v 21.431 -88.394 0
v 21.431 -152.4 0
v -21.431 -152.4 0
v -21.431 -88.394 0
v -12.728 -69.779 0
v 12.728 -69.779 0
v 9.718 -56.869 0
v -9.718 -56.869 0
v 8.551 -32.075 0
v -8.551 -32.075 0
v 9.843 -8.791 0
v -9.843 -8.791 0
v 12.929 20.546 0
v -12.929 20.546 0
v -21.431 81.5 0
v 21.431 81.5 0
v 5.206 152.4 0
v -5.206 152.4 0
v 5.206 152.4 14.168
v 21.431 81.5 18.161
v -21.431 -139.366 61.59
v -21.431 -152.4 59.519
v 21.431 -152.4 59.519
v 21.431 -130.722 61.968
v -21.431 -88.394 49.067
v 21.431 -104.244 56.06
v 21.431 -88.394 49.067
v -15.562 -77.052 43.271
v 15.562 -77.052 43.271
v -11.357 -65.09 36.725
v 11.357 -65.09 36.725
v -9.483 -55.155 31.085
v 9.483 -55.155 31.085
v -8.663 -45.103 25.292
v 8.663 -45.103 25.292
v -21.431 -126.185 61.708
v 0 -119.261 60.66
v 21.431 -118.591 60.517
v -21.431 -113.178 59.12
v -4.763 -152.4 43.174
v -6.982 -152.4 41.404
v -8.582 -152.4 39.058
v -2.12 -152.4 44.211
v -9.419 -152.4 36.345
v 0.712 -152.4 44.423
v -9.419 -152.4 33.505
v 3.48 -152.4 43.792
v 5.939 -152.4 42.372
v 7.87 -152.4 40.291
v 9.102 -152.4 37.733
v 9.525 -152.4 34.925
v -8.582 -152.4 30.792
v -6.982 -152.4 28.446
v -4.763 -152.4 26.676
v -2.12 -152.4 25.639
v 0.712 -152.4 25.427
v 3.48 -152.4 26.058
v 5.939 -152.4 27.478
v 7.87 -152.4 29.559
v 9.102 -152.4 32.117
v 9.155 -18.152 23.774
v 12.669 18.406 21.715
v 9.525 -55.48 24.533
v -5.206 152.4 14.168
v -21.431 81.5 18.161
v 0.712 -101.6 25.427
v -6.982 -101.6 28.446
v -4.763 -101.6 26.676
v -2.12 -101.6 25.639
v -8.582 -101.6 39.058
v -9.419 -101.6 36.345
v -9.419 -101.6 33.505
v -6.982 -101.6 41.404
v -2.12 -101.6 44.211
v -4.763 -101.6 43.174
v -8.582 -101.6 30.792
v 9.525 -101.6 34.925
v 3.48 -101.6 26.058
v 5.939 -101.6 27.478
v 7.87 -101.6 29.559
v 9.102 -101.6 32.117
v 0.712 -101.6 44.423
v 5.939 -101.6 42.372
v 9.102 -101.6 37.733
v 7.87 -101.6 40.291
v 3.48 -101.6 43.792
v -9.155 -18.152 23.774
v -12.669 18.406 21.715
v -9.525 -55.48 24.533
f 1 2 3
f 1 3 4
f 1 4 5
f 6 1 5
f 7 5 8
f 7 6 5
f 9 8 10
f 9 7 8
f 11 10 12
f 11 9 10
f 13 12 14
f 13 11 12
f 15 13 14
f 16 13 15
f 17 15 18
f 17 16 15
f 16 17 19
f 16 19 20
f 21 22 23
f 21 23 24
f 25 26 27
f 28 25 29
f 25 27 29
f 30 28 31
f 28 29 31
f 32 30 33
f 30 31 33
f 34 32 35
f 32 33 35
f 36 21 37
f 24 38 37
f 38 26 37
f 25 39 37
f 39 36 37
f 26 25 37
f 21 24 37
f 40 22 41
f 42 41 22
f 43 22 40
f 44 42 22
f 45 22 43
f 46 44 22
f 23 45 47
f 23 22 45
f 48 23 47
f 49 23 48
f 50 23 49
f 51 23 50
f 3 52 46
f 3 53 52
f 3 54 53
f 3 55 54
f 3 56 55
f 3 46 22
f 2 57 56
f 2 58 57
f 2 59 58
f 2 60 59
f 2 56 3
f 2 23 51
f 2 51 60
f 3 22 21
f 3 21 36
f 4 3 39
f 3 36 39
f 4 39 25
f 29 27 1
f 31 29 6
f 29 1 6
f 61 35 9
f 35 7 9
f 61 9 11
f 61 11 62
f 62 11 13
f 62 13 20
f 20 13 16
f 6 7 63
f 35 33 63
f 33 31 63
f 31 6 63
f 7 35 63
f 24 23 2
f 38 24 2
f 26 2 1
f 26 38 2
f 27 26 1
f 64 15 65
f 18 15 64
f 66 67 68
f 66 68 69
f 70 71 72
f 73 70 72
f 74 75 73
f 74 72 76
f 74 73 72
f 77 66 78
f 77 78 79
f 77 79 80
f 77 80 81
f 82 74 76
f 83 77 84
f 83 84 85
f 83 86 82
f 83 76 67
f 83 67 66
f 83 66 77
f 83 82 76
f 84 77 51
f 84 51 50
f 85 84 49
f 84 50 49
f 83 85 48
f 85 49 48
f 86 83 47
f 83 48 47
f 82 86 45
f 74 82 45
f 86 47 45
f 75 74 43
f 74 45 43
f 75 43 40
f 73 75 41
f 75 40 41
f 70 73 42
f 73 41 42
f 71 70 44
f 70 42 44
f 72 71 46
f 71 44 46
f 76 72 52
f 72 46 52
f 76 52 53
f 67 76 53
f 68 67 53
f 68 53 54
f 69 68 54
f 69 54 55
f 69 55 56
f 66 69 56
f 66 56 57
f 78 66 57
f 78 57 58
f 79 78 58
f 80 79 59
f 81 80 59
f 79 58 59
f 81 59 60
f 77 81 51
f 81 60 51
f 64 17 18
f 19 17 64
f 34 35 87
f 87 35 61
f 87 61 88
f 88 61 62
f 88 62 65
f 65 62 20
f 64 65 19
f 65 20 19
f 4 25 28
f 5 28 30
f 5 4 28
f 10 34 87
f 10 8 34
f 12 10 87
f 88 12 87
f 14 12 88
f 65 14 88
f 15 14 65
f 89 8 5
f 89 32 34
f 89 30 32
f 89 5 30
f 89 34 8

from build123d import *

# Parameters (mm, degrees)
F1_DEPTH = 21.43125
F2_R     = 9.525
F3_DEPTH = 50.8
F6_DEPTH = 42.8635
F7_DEPTH = 61.9829719698


with BuildPart() as f1:
    # F0 (on Right) → F1 (new body, symmetric)
    with BuildSketch(Plane.YZ):
        Polygon((-152.4, 69.85), (-152.4, 0), (152.4, 0), (152.4, 19.05), align=None)
    extrude(amount=F1_DEPTH, both=True)

    # F2 (on face) → F3 (cut)
    with BuildSketch(Plane.XZ.offset(152.4)):
        with Locations((0, 34.925)):
            Circle(F2_R)
    extrude(amount=-F3_DEPTH, mode=Mode.SUBTRACT)

    # F4 (on face) → F6 (cut, through all)
    with BuildSketch(Plane.YZ.offset(21.43125)):
        with BuildLine():
            Line((-152.4, 69.85), (-152.4, 59.5187321305))
            add(Edge.make_bspline(
                [(-152.4, 59.5187321305), (-142.2583344868, 61.4276814743), (-116.1526932903, 66.3415042155), (-72.0639469007, 40.8688743493), (-45.1030433178, 25.2919942141)],
                knots=[0, 0, 0, 0, 0.3884855935, 1, 1, 1, 1], degree=3))
            Line((-45.1030433178, 25.2919942141), (152.4, 14.1683043912))
            Line((152.4, 14.1683043912), (152.4, 19.05))
            Line((152.4, 19.05), (-152.4, 69.85))
        make_face()
    extrude(amount=-F6_DEPTH, mode=Mode.SUBTRACT)

    # F5 (on face) → F7 (intersect, through all)
    with BuildSketch(Plane(origin=(0, 0, 0), x_dir=(1, 0, 0), z_dir=(0, 0, -1))):
        with BuildLine():
            Line((-21.43125, 152.4), (-21.43125, 88.3942618966))
            add(Edge.make_bspline(
                [(-21.43125, 88.3942618966), (-16.4613031807, 79.4460650051), (-1.6409073495, 52.762515919), (-13.5294629941, -27.8924381707), (-21.43125, -81.5001502633)],
                knots=[0, 0, 0, 0, 0.3353450796, 1, 1, 1, 1], degree=3))
            Line((-21.43125, -81.5001502633), (-5.206305068, -152.4))
            Line((-5.206305068, -152.4), (5.206305068, -152.4))
            Line((5.206305068, -152.4), (21.43125, -81.5001502633))
            add(Edge.make_bspline(
                [(21.43125, 88.3942618966), (16.4613031807, 79.4460650051), (1.6409073495, 52.762515919), (13.5294629941, -27.8924381707), (21.43125, -81.5001502633)],
                knots=[0, 0, 0, 0, 0.3353450796, 1, 1, 1, 1], degree=3))
            Line((21.43125, 88.3942618966), (21.43125, 152.4))
            Line((21.43125, 152.4), (-21.43125, 152.4))
        make_face()
    extrude(amount=-F7_DEPTH, mode=Mode.INTERSECT)


solid = f1.part
